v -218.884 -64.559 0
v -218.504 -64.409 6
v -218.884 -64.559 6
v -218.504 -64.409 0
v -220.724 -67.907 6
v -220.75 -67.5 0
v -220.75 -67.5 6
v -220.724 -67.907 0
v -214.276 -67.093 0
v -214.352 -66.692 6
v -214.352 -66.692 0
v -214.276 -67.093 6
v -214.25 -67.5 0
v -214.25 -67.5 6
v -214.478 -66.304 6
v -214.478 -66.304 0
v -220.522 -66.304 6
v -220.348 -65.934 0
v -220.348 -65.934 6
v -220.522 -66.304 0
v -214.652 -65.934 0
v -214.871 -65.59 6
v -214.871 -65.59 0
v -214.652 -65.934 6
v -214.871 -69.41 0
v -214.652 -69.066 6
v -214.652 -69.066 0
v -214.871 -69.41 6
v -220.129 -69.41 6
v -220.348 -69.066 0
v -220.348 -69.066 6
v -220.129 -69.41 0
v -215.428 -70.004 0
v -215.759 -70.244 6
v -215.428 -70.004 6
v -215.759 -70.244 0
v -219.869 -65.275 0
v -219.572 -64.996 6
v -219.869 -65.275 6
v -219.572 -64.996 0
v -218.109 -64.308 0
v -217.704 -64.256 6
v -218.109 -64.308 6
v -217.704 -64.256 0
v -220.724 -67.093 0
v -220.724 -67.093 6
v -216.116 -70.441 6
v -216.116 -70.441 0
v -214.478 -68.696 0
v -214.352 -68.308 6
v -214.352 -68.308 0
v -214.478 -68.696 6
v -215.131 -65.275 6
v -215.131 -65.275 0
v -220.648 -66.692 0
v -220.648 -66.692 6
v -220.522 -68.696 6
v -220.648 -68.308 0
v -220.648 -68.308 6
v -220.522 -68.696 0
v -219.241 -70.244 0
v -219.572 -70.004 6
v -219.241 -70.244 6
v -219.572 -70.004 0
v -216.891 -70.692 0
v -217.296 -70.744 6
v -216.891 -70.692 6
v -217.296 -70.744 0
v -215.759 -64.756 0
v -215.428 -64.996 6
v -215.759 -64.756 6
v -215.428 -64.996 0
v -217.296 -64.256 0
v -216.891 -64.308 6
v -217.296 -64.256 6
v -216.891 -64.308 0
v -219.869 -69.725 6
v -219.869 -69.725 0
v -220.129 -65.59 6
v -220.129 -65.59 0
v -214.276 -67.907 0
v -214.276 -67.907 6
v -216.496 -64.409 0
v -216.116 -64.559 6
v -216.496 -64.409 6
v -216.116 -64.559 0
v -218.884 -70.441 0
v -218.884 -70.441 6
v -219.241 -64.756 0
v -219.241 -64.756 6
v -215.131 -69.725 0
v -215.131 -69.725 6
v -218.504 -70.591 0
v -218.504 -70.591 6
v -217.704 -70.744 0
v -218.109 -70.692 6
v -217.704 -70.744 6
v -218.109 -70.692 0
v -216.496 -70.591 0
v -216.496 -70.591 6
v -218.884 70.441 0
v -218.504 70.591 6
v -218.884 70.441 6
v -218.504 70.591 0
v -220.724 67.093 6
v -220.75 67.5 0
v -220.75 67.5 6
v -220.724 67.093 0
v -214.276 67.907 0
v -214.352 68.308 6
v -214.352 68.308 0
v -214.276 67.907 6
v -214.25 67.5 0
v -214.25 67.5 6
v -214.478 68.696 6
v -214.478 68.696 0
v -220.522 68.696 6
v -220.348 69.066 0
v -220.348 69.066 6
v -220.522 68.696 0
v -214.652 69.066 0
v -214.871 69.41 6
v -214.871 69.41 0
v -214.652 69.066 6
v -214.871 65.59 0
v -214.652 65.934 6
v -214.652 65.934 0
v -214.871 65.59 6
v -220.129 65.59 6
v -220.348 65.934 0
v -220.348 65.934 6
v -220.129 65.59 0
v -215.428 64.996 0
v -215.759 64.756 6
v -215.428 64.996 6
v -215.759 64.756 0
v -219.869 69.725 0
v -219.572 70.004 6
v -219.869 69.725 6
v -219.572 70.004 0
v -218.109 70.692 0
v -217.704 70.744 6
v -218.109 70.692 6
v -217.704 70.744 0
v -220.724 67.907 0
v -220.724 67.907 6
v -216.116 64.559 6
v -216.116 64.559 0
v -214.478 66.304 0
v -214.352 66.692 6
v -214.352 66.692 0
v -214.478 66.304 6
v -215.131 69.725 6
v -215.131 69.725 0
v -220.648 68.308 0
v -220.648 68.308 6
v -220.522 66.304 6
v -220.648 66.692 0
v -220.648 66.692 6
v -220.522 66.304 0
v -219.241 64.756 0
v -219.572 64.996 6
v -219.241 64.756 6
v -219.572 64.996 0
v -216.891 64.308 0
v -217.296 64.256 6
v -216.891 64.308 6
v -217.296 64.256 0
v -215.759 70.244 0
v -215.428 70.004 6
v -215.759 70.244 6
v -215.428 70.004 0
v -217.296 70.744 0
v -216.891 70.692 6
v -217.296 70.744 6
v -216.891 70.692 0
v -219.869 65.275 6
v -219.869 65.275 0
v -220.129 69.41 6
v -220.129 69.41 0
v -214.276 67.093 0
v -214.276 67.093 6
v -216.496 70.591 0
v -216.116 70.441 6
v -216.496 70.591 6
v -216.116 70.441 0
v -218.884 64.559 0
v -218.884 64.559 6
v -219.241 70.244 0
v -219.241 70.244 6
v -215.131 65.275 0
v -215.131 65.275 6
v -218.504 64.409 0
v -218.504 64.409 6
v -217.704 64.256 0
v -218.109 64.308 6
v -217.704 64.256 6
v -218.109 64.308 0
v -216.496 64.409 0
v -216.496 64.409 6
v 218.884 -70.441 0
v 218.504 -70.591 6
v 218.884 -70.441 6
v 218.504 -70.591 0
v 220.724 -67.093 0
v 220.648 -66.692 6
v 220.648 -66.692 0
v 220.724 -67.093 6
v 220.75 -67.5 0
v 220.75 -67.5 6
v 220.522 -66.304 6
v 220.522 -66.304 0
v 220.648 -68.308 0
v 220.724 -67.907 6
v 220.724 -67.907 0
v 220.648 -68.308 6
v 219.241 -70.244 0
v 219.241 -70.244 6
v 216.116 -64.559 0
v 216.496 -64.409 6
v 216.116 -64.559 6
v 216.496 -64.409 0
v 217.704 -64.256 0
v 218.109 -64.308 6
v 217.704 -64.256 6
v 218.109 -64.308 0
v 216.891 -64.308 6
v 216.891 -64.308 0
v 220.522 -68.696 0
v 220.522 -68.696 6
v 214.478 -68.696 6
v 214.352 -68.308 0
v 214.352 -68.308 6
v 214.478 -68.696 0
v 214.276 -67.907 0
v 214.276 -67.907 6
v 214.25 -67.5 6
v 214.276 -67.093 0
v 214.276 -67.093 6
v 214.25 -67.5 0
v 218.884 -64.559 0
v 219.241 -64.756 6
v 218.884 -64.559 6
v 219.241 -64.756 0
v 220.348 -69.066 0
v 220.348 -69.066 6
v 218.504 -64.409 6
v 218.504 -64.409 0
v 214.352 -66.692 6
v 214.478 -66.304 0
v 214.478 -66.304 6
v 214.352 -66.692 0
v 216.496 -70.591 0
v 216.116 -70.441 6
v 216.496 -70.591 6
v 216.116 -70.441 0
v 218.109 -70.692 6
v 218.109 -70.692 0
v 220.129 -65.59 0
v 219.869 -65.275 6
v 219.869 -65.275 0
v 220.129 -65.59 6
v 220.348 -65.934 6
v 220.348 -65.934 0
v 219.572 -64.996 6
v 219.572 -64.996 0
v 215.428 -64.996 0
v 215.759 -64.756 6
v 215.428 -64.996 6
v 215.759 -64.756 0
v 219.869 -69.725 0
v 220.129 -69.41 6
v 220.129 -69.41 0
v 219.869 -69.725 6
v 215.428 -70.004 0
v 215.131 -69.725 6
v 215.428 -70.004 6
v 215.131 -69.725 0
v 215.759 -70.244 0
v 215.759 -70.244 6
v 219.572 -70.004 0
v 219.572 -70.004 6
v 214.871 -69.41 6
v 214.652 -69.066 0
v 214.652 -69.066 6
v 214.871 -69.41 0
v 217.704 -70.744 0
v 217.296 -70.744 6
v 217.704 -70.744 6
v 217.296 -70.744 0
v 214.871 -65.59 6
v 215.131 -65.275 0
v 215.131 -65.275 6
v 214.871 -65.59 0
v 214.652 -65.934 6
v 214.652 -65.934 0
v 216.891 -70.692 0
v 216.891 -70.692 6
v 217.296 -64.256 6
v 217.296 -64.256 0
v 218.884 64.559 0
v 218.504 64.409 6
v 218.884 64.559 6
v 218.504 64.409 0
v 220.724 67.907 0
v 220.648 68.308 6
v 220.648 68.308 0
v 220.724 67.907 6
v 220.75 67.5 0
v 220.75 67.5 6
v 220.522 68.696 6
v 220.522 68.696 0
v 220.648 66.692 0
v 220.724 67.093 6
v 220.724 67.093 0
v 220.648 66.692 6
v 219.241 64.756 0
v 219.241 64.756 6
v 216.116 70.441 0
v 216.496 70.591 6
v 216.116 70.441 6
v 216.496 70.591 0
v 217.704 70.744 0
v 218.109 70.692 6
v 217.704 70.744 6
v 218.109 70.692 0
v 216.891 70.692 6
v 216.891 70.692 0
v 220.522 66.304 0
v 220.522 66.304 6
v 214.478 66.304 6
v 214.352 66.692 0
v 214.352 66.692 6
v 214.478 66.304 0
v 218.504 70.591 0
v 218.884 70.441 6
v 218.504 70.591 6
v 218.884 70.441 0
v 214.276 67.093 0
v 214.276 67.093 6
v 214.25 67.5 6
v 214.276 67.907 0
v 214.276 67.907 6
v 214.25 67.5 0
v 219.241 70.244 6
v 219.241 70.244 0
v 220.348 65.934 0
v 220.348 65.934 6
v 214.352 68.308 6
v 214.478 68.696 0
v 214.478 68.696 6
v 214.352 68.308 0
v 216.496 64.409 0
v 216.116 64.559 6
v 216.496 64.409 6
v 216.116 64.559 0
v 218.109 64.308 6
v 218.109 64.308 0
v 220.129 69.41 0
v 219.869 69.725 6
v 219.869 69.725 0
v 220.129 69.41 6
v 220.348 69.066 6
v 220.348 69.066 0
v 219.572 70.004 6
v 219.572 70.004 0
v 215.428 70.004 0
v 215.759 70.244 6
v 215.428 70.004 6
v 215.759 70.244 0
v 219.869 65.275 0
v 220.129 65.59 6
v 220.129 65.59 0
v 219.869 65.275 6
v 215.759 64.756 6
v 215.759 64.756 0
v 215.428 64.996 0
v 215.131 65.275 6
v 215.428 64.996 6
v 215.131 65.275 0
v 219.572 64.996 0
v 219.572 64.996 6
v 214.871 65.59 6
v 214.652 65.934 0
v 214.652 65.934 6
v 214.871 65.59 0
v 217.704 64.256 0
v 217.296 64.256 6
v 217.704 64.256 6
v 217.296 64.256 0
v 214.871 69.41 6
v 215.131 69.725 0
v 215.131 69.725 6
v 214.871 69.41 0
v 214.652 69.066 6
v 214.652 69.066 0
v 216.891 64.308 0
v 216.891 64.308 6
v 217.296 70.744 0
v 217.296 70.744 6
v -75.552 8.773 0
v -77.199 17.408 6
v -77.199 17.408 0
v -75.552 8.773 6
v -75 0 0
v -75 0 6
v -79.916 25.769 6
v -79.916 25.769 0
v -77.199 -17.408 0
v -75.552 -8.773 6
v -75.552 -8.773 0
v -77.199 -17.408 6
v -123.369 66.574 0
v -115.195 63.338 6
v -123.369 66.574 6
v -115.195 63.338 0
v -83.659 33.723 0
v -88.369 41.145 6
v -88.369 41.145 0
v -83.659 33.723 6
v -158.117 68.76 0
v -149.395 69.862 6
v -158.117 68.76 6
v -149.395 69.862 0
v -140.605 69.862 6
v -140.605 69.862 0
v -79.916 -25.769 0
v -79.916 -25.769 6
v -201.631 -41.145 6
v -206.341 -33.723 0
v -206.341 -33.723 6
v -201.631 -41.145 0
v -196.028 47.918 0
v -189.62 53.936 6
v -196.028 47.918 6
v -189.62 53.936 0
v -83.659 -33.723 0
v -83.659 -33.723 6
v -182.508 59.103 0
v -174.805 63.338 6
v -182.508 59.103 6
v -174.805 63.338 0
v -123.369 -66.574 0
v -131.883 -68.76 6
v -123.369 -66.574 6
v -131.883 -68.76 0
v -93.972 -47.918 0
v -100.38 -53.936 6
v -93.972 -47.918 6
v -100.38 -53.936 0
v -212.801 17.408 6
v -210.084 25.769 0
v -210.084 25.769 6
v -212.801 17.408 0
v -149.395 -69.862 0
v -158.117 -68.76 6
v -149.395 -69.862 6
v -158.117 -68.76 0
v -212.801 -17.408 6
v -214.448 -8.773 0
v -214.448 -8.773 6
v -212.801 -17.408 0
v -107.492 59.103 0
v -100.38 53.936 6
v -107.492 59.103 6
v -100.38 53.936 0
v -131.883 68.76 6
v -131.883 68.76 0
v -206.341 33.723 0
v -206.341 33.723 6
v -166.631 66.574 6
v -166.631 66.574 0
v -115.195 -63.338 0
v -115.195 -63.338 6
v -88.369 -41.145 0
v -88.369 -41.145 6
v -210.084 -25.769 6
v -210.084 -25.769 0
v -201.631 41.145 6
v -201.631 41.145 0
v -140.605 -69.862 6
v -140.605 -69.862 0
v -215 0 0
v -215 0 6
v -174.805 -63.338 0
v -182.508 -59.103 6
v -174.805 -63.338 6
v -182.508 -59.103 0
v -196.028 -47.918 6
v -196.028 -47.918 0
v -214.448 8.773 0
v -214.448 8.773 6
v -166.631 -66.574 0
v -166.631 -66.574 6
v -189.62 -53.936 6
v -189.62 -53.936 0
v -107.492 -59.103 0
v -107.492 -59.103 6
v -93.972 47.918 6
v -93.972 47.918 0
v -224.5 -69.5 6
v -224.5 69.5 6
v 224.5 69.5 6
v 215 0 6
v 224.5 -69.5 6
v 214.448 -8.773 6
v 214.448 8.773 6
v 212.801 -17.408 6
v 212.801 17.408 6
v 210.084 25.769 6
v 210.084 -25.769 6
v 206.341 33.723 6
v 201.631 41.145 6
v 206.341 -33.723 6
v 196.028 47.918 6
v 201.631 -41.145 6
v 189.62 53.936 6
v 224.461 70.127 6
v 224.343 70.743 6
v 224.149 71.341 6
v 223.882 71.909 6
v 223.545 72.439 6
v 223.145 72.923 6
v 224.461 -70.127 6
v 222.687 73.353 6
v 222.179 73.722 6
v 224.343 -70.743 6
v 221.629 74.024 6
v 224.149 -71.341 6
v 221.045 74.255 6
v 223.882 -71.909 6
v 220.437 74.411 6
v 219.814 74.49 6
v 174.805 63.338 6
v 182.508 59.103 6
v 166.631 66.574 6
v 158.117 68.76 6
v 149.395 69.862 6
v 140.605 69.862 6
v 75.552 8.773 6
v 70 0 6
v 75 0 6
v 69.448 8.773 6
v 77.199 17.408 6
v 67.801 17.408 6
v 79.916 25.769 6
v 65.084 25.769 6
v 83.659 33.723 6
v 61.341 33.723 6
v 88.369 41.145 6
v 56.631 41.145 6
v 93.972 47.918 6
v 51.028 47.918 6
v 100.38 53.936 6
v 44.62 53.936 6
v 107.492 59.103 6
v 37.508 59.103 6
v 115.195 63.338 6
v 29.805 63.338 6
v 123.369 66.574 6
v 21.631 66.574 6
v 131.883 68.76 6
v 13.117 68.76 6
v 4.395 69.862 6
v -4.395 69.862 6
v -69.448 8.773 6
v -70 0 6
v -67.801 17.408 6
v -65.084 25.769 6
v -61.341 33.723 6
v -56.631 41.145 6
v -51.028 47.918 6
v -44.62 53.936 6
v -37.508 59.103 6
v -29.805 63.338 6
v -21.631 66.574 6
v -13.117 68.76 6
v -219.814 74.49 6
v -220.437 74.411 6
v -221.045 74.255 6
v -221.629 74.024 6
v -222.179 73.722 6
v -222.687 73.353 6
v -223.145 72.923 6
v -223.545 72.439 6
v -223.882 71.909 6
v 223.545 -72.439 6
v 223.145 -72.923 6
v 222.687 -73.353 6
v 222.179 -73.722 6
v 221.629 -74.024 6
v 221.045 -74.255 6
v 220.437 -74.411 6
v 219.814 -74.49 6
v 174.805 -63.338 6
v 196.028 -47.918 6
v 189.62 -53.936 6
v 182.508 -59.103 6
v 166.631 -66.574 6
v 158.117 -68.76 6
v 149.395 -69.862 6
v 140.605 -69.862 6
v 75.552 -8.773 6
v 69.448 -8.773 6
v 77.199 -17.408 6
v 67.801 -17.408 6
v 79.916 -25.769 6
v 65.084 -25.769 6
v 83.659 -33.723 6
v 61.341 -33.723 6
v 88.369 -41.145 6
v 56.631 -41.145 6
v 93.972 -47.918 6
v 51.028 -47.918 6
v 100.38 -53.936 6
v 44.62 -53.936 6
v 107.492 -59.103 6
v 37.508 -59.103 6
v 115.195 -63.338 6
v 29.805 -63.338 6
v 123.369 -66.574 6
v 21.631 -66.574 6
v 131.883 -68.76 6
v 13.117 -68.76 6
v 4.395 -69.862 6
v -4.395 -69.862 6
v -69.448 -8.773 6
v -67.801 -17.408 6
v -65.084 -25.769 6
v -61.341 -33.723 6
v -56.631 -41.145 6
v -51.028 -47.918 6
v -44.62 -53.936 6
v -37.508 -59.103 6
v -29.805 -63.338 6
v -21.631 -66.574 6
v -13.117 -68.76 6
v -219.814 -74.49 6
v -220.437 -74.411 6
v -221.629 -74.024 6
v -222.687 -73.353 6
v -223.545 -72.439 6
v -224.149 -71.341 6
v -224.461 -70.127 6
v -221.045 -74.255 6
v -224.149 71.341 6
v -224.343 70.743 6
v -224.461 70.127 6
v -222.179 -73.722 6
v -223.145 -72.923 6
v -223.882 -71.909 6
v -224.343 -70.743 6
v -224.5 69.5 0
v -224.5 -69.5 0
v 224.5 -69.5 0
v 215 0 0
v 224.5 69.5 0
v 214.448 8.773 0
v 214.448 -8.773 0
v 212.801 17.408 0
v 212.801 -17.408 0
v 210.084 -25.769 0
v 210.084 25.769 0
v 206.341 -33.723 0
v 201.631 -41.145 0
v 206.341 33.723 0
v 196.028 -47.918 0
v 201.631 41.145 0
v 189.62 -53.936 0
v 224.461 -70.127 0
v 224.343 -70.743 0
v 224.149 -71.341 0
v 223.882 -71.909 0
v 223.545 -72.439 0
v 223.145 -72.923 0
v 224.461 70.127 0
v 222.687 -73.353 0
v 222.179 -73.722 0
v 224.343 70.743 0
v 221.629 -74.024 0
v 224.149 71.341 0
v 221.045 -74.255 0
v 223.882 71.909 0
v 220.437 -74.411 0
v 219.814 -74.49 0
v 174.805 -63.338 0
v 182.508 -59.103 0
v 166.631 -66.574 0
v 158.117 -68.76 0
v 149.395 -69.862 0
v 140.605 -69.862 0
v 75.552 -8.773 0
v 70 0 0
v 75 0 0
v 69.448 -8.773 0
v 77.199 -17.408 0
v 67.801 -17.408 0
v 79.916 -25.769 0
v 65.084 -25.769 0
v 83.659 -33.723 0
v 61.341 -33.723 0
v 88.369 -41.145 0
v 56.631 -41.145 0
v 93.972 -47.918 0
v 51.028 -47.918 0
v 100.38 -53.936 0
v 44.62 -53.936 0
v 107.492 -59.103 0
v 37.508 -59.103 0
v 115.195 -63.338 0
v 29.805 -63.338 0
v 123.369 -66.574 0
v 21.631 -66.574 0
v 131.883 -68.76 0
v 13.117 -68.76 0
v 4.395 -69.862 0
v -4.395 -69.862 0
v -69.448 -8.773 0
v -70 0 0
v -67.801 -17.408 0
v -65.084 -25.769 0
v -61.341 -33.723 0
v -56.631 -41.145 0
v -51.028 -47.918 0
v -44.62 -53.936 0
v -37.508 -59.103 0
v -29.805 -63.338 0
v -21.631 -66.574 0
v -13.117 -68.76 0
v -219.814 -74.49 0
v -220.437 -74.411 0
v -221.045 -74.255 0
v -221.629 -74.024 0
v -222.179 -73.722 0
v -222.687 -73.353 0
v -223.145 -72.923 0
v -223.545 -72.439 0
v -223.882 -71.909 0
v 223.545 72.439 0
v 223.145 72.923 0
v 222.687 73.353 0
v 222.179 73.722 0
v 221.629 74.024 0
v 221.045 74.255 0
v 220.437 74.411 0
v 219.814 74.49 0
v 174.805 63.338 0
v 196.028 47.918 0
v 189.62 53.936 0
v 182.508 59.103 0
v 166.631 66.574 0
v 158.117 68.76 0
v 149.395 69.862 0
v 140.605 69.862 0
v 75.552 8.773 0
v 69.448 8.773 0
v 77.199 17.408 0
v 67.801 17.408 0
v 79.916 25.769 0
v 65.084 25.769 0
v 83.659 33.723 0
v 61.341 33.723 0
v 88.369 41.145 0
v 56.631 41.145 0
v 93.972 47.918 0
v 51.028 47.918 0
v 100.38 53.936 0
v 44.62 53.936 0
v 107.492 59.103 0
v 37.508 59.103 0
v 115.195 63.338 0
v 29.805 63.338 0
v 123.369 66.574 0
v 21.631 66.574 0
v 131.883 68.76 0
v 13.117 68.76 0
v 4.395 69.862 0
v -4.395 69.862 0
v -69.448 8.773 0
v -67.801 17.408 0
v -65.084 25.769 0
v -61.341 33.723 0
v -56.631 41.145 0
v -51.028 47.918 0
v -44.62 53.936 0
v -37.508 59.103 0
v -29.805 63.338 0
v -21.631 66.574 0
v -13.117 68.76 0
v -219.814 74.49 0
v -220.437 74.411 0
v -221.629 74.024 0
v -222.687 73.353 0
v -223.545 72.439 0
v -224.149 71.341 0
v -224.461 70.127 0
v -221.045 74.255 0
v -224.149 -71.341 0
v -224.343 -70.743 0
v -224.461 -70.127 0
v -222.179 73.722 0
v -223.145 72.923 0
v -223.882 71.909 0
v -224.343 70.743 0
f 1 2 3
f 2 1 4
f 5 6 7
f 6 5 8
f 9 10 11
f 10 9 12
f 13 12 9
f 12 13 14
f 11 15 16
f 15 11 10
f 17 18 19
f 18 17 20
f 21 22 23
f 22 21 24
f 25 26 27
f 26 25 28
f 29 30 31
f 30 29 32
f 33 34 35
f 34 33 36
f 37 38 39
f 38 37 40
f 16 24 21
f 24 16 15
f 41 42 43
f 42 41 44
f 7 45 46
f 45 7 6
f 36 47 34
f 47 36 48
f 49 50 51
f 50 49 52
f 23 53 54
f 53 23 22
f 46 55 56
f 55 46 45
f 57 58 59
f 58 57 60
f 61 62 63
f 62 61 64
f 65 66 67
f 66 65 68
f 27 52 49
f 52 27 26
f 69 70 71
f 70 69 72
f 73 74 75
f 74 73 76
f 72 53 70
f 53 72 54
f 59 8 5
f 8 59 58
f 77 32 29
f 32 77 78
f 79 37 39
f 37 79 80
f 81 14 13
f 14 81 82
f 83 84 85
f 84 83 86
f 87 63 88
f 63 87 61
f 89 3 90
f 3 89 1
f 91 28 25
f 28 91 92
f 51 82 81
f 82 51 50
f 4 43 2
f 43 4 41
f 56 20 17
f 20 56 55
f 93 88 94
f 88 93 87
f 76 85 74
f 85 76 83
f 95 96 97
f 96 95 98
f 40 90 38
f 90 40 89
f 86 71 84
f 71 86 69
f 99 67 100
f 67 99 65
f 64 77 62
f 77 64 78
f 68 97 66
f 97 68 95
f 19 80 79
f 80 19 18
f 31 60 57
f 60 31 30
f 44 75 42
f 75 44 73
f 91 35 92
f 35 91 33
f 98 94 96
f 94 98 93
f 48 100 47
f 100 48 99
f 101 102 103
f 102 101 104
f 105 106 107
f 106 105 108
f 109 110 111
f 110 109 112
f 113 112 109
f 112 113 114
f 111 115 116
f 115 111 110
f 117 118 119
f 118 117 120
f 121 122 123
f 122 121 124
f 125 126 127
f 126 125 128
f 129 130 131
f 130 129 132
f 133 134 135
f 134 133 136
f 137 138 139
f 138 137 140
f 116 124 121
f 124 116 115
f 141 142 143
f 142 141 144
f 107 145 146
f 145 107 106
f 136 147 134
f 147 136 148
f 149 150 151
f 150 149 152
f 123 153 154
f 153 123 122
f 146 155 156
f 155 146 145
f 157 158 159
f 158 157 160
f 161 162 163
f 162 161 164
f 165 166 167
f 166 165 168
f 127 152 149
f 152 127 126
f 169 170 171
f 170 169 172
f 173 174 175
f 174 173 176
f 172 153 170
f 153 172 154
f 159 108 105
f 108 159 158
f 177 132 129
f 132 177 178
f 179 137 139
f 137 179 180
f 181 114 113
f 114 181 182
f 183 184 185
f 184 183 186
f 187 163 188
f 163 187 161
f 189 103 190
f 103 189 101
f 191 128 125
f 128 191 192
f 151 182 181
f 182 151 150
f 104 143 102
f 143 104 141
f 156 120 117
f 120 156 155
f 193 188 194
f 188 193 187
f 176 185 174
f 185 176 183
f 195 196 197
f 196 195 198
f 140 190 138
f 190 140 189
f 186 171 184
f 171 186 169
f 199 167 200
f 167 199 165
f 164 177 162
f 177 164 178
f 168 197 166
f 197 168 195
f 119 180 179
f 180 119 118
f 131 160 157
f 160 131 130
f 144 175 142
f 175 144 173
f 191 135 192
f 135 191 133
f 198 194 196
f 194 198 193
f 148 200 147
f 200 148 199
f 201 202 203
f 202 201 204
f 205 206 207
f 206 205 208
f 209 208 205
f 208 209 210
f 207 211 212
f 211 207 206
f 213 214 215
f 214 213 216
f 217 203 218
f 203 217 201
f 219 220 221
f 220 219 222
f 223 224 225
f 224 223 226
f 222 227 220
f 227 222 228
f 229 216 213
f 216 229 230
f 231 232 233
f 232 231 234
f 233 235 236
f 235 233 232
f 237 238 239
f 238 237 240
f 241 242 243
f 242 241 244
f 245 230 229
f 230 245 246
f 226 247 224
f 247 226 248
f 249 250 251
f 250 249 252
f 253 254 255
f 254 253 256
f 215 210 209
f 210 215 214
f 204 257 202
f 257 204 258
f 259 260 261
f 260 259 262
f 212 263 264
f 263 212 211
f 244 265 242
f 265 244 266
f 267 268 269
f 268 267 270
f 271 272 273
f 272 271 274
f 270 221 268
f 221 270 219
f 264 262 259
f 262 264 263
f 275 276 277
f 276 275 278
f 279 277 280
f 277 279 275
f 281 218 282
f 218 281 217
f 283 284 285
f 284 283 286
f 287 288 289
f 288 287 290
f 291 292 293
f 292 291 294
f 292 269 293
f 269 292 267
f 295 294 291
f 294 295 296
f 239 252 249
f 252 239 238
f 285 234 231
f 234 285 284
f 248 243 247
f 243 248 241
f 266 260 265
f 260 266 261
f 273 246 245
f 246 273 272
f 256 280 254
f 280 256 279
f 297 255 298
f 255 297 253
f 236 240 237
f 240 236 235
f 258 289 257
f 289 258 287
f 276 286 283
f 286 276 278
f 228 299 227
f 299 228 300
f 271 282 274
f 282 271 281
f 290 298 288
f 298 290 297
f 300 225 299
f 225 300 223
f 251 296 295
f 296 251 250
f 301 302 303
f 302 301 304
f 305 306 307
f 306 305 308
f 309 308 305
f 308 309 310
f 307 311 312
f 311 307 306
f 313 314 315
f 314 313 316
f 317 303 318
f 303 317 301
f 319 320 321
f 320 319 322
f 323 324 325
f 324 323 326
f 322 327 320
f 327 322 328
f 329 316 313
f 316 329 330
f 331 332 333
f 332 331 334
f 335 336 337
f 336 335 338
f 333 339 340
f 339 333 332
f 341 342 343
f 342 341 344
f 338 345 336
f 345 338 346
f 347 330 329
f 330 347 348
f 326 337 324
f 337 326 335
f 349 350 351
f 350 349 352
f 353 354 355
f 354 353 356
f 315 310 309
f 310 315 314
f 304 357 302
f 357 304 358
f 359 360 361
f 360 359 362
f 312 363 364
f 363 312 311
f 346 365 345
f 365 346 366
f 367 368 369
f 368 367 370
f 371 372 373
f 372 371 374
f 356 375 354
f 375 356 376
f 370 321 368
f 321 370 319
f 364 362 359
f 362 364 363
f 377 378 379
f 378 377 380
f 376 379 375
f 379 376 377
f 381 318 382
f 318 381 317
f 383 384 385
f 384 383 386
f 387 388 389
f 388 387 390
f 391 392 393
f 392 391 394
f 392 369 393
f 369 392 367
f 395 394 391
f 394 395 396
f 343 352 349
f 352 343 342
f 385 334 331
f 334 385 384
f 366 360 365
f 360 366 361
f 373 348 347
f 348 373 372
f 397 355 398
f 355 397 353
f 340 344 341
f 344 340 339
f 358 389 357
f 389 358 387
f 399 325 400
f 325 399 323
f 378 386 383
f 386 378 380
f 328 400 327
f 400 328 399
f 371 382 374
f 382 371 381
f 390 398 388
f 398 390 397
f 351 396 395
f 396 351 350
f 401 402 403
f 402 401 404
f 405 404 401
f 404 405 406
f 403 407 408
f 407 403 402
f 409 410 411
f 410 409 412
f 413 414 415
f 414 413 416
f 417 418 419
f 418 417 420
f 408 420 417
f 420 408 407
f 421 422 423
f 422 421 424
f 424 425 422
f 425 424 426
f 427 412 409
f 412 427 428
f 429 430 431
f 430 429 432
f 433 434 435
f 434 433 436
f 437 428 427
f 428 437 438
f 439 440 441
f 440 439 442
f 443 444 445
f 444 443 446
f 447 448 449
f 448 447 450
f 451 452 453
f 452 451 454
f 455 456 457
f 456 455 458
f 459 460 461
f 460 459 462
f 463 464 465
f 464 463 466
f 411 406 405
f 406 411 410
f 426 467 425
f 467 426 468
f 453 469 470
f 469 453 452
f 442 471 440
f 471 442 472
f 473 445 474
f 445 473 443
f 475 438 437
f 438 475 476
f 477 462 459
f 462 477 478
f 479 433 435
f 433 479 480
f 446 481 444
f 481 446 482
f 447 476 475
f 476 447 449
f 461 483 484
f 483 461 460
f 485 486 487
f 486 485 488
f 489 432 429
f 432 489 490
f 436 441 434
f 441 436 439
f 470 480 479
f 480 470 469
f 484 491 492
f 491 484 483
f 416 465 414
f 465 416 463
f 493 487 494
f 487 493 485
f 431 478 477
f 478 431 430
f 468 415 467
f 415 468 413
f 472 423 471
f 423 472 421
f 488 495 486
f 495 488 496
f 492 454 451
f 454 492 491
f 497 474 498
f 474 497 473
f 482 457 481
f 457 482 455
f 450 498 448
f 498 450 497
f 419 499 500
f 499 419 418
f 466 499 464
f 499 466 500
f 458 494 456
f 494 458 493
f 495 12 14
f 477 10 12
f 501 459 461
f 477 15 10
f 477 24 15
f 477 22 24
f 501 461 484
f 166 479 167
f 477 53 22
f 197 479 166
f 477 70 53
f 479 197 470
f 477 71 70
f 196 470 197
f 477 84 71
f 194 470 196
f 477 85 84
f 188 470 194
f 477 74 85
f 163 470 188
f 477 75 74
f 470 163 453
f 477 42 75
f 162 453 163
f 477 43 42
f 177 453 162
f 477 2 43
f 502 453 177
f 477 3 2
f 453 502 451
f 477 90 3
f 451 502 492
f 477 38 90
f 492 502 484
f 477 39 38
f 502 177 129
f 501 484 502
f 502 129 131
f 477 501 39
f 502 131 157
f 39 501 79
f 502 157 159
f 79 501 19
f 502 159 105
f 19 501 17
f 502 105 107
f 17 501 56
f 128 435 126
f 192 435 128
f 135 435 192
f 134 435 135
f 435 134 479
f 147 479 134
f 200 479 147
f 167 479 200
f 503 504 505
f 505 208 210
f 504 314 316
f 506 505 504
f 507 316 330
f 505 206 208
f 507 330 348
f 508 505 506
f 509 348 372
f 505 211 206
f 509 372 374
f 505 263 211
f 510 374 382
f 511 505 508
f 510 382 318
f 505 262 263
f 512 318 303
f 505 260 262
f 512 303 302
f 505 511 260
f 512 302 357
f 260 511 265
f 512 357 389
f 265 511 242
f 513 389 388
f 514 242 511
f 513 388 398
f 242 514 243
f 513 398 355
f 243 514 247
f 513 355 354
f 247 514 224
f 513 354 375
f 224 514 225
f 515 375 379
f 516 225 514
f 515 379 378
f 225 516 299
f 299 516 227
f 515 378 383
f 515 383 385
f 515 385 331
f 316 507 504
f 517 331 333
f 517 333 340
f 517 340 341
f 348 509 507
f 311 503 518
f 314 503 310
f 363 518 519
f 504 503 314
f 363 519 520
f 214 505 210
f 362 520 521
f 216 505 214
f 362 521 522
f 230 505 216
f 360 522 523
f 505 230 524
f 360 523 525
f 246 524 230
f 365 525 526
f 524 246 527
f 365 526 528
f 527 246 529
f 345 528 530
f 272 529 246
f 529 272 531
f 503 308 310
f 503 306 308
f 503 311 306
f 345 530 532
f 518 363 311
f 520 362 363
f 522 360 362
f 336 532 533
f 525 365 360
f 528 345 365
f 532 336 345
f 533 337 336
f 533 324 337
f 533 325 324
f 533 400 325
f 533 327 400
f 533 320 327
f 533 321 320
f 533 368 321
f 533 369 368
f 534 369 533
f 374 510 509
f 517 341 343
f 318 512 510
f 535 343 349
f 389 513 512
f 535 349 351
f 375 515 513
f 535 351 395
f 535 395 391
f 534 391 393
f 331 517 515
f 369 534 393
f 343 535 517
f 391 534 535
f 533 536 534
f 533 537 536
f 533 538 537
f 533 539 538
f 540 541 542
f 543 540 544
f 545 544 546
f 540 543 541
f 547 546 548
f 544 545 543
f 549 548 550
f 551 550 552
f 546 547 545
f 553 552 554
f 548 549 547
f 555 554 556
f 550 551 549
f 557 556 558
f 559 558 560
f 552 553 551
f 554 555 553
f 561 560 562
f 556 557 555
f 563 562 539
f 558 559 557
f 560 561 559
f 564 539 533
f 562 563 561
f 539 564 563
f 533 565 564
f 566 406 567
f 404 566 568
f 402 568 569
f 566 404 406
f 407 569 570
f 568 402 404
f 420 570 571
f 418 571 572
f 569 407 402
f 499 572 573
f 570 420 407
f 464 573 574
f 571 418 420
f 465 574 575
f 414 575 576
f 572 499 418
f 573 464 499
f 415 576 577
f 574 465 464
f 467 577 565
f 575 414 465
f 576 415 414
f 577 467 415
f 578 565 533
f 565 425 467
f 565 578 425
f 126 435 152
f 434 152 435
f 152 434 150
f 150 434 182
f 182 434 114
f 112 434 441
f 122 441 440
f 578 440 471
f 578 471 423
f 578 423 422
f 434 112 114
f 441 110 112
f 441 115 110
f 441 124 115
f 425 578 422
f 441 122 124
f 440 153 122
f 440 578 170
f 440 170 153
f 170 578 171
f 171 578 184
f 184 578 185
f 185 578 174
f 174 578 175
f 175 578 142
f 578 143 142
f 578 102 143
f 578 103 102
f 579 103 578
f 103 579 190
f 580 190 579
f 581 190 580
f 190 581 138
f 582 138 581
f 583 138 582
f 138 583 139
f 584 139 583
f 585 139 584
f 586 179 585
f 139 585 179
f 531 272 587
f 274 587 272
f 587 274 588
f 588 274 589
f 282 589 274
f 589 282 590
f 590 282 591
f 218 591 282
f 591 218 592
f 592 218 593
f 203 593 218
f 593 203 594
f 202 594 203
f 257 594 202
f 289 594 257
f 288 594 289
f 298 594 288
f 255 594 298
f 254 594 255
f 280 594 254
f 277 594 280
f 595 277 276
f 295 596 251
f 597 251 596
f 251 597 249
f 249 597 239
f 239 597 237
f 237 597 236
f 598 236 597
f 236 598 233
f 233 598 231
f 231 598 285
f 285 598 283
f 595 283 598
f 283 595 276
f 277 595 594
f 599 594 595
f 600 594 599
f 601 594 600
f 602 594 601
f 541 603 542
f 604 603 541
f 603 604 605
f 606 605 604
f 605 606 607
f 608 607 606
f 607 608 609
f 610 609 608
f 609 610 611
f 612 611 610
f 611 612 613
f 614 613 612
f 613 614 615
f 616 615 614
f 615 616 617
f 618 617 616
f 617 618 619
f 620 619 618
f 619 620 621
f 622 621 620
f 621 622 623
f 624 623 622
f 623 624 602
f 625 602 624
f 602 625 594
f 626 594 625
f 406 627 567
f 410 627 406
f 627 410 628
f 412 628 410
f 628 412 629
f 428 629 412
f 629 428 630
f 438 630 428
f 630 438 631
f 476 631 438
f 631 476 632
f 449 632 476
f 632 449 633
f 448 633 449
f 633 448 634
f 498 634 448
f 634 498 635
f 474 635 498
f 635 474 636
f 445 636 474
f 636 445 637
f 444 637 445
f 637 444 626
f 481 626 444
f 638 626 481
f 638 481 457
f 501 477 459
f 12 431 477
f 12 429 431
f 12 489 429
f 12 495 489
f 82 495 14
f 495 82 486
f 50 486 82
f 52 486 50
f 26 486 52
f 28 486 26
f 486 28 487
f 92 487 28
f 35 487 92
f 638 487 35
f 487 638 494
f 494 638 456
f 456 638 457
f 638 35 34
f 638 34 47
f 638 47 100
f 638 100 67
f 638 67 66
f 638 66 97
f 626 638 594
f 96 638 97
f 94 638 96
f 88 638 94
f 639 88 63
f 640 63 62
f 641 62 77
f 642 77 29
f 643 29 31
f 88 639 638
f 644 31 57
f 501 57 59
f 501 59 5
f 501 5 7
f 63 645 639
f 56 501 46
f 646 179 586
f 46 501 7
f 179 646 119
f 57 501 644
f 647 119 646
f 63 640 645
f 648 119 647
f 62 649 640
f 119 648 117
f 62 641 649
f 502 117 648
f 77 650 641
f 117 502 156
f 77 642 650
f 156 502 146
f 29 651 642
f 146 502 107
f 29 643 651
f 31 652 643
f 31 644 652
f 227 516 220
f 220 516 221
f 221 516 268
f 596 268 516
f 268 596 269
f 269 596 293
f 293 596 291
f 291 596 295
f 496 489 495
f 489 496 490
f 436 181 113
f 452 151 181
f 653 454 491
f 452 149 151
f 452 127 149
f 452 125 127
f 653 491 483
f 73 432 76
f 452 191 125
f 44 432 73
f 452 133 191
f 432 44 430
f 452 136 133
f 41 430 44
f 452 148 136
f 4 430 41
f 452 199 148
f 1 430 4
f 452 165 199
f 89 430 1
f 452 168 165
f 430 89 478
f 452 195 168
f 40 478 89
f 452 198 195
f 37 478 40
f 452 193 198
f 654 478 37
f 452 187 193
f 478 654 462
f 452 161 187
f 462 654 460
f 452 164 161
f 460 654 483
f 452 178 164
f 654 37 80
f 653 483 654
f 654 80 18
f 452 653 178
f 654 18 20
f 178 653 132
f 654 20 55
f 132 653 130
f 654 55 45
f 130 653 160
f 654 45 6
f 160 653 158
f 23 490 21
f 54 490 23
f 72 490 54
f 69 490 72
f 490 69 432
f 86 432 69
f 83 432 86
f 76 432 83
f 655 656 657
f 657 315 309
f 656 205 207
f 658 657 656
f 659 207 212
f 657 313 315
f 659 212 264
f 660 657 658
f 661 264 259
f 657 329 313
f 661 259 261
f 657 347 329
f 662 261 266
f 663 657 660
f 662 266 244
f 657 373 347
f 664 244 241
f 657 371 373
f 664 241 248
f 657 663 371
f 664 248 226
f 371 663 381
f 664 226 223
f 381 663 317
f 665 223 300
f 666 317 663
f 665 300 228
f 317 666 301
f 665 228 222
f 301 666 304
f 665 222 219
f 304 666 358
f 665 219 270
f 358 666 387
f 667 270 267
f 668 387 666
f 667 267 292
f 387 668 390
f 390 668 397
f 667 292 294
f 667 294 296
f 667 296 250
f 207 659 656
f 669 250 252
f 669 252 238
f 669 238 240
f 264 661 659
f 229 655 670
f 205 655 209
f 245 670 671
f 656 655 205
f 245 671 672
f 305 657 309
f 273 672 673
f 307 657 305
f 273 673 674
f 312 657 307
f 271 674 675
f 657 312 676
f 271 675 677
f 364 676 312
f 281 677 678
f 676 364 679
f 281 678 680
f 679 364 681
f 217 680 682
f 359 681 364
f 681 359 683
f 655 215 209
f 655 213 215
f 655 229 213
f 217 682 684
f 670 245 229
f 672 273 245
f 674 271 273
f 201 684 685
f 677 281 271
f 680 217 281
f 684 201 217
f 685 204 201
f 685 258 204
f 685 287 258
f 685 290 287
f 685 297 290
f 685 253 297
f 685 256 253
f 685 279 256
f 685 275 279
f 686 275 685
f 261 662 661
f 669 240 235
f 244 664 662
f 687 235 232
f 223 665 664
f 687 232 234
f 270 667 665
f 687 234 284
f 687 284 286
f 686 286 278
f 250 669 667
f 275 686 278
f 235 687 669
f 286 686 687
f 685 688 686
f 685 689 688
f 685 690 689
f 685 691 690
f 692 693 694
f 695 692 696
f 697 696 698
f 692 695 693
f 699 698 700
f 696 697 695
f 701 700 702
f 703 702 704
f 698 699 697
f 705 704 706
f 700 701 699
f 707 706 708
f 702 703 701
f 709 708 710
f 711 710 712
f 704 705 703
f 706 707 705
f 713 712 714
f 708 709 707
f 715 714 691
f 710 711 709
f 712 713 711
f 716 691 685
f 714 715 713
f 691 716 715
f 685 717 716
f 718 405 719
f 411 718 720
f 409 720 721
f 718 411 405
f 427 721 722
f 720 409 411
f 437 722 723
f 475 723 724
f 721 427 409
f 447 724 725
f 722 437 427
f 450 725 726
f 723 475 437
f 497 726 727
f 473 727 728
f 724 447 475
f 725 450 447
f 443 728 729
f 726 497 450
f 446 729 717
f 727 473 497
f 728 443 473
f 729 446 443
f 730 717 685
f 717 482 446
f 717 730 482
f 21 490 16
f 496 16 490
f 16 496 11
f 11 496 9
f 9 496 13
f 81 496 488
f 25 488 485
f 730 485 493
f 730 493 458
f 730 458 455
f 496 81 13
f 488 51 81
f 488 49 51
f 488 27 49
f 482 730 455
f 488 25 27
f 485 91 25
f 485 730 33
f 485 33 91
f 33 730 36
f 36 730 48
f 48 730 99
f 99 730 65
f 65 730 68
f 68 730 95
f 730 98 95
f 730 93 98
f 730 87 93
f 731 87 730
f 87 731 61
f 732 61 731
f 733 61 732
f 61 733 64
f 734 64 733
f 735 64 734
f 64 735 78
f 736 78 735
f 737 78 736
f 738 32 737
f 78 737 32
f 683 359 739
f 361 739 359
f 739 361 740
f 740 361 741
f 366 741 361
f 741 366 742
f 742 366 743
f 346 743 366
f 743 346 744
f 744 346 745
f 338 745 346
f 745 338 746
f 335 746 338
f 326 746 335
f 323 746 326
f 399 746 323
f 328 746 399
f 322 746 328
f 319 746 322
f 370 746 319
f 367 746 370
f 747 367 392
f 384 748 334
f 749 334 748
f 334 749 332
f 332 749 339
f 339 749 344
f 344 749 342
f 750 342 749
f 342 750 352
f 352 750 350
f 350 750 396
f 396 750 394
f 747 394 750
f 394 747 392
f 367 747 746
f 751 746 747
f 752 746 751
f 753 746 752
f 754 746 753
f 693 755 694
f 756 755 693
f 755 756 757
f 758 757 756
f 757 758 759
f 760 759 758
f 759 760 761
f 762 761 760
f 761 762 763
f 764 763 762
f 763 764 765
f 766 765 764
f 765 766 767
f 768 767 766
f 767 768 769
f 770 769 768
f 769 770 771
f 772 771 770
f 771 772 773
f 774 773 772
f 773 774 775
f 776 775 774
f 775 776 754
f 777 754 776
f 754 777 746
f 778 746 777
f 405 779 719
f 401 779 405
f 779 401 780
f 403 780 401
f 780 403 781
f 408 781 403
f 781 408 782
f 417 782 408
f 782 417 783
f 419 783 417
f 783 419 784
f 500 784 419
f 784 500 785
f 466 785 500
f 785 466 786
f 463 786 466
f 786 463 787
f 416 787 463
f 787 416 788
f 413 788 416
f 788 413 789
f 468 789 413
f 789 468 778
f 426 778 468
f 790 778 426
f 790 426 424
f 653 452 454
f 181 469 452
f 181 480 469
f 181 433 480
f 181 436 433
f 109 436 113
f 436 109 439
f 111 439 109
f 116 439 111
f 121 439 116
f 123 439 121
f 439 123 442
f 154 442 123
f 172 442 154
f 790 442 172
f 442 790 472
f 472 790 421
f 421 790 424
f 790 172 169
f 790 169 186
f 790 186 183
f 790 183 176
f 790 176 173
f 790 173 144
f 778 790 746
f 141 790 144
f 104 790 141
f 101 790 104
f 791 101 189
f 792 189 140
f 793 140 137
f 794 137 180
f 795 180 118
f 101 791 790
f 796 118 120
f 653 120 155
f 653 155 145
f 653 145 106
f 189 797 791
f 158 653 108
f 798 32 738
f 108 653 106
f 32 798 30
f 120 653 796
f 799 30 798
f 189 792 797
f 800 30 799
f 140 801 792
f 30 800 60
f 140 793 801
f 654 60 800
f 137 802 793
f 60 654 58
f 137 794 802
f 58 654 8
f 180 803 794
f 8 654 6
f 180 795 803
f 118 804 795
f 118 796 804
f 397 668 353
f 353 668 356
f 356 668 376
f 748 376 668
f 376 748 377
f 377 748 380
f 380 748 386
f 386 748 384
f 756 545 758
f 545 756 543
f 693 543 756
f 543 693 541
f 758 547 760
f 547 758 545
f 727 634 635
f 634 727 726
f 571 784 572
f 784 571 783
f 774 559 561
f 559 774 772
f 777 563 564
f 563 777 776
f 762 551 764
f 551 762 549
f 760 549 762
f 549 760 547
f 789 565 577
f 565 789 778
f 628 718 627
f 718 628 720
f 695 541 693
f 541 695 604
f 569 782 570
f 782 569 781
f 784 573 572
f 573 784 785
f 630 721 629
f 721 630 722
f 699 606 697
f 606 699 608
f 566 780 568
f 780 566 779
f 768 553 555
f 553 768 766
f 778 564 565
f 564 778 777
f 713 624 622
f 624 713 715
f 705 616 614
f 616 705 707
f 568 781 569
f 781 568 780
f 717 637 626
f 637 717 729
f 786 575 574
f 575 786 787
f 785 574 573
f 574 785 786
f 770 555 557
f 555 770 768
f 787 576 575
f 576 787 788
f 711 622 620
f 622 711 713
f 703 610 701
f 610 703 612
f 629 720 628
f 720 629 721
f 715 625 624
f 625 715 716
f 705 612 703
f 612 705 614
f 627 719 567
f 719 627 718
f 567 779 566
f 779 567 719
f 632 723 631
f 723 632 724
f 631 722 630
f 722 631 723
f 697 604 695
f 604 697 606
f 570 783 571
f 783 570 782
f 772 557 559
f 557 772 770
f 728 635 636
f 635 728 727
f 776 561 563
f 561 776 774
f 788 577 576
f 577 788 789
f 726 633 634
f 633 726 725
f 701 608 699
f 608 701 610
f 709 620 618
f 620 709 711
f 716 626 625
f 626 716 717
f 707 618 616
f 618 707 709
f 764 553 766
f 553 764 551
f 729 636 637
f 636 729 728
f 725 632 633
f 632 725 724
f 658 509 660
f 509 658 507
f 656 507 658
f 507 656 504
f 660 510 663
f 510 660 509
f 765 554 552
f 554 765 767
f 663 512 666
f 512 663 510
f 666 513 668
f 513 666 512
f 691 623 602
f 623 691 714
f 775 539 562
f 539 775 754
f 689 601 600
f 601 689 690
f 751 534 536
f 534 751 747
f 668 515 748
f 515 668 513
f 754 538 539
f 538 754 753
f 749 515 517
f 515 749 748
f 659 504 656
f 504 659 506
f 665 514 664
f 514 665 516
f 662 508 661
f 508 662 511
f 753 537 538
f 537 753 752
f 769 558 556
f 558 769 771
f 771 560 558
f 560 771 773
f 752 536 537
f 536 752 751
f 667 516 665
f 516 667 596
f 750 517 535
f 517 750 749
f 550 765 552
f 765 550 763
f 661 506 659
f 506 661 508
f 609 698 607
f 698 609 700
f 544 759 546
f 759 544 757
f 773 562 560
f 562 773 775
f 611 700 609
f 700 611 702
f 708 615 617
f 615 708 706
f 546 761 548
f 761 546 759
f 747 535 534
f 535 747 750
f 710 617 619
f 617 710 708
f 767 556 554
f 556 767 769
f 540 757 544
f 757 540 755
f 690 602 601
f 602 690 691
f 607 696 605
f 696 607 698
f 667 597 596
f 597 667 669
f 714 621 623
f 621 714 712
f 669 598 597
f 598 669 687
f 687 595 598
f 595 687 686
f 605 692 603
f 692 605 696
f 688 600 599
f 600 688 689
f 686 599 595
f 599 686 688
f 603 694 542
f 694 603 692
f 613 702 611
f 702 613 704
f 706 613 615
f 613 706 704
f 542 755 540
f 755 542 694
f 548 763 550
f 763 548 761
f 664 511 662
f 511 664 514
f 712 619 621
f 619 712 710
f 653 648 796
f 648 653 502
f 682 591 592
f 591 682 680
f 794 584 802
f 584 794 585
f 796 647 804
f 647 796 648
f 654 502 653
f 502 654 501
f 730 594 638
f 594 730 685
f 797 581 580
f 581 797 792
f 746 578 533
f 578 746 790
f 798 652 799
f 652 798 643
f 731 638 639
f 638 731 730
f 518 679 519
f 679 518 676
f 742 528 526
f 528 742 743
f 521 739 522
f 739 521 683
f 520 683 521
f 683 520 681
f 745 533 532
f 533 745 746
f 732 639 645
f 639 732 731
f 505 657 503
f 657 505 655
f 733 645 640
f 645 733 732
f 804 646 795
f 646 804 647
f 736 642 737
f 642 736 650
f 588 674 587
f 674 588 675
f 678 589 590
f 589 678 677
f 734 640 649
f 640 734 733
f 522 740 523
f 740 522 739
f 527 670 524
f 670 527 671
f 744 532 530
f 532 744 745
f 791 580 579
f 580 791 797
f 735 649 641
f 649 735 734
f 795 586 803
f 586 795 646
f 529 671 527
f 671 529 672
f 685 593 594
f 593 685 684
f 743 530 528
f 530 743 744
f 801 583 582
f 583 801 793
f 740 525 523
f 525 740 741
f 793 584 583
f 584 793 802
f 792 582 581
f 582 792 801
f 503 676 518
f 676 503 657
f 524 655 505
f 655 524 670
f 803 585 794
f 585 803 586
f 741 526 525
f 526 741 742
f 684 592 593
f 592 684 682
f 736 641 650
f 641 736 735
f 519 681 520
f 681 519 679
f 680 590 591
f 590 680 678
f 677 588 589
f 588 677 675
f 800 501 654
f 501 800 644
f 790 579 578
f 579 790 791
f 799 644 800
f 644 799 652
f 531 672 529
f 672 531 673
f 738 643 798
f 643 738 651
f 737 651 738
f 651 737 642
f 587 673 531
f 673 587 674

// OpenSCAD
$fn = 50;

difference() {
	union() {
		hull() {
			translate(v = [-219.5, 69.5, 0]) {
				cylinder(h = 6, r = 5);
			}
			translate(v = [219.5, 69.5, 0]) {
				cylinder(h = 6, r = 5);
			}
			translate(v = [-219.5, -69.5, 0]) {
				cylinder(h = 6, r = 5);
			}
			translate(v = [219.5, -69.5, 0]) {
				cylinder(h = 6, r = 5);
			}
		}
	}
	union() {
		translate(v = [-217.5, -67.5, -100.0]) {
			cylinder(h = 200, r = 3.25);
		}
		translate(v = [-217.5, 67.5, -100.0]) {
			cylinder(h = 200, r = 3.25);
		}
		translate(v = [217.5, -67.5, -100.0]) {
			cylinder(h = 200, r = 3.25);
		}
		translate(v = [217.5, 67.5, -100.0]) {
			cylinder(h = 200, r = 3.25);
		}
		translate(v = [-217.5, -67.5, -100.0]) {
			cylinder(h = 200, r = 1.8);
		}
		translate(v = [-217.5, 67.5, -100.0]) {
			cylinder(h = 200, r = 1.8);
		}
		translate(v = [217.5, -67.5, -100.0]) {
			cylinder(h = 200, r = 1.8);
		}
		translate(v = [217.5, 67.5, -100.0]) {
			cylinder(h = 200, r = 1.8);
		}
		translate(v = [-145.0, 0, 0.0]) {
			cylinder(h = 6, r = 70.0);
		}
		cylinder(h = 6, r = 70.0);
		translate(v = [145.0, 0, 0.0]) {
			cylinder(h = 6, r = 70.0);
		}
	}
}
